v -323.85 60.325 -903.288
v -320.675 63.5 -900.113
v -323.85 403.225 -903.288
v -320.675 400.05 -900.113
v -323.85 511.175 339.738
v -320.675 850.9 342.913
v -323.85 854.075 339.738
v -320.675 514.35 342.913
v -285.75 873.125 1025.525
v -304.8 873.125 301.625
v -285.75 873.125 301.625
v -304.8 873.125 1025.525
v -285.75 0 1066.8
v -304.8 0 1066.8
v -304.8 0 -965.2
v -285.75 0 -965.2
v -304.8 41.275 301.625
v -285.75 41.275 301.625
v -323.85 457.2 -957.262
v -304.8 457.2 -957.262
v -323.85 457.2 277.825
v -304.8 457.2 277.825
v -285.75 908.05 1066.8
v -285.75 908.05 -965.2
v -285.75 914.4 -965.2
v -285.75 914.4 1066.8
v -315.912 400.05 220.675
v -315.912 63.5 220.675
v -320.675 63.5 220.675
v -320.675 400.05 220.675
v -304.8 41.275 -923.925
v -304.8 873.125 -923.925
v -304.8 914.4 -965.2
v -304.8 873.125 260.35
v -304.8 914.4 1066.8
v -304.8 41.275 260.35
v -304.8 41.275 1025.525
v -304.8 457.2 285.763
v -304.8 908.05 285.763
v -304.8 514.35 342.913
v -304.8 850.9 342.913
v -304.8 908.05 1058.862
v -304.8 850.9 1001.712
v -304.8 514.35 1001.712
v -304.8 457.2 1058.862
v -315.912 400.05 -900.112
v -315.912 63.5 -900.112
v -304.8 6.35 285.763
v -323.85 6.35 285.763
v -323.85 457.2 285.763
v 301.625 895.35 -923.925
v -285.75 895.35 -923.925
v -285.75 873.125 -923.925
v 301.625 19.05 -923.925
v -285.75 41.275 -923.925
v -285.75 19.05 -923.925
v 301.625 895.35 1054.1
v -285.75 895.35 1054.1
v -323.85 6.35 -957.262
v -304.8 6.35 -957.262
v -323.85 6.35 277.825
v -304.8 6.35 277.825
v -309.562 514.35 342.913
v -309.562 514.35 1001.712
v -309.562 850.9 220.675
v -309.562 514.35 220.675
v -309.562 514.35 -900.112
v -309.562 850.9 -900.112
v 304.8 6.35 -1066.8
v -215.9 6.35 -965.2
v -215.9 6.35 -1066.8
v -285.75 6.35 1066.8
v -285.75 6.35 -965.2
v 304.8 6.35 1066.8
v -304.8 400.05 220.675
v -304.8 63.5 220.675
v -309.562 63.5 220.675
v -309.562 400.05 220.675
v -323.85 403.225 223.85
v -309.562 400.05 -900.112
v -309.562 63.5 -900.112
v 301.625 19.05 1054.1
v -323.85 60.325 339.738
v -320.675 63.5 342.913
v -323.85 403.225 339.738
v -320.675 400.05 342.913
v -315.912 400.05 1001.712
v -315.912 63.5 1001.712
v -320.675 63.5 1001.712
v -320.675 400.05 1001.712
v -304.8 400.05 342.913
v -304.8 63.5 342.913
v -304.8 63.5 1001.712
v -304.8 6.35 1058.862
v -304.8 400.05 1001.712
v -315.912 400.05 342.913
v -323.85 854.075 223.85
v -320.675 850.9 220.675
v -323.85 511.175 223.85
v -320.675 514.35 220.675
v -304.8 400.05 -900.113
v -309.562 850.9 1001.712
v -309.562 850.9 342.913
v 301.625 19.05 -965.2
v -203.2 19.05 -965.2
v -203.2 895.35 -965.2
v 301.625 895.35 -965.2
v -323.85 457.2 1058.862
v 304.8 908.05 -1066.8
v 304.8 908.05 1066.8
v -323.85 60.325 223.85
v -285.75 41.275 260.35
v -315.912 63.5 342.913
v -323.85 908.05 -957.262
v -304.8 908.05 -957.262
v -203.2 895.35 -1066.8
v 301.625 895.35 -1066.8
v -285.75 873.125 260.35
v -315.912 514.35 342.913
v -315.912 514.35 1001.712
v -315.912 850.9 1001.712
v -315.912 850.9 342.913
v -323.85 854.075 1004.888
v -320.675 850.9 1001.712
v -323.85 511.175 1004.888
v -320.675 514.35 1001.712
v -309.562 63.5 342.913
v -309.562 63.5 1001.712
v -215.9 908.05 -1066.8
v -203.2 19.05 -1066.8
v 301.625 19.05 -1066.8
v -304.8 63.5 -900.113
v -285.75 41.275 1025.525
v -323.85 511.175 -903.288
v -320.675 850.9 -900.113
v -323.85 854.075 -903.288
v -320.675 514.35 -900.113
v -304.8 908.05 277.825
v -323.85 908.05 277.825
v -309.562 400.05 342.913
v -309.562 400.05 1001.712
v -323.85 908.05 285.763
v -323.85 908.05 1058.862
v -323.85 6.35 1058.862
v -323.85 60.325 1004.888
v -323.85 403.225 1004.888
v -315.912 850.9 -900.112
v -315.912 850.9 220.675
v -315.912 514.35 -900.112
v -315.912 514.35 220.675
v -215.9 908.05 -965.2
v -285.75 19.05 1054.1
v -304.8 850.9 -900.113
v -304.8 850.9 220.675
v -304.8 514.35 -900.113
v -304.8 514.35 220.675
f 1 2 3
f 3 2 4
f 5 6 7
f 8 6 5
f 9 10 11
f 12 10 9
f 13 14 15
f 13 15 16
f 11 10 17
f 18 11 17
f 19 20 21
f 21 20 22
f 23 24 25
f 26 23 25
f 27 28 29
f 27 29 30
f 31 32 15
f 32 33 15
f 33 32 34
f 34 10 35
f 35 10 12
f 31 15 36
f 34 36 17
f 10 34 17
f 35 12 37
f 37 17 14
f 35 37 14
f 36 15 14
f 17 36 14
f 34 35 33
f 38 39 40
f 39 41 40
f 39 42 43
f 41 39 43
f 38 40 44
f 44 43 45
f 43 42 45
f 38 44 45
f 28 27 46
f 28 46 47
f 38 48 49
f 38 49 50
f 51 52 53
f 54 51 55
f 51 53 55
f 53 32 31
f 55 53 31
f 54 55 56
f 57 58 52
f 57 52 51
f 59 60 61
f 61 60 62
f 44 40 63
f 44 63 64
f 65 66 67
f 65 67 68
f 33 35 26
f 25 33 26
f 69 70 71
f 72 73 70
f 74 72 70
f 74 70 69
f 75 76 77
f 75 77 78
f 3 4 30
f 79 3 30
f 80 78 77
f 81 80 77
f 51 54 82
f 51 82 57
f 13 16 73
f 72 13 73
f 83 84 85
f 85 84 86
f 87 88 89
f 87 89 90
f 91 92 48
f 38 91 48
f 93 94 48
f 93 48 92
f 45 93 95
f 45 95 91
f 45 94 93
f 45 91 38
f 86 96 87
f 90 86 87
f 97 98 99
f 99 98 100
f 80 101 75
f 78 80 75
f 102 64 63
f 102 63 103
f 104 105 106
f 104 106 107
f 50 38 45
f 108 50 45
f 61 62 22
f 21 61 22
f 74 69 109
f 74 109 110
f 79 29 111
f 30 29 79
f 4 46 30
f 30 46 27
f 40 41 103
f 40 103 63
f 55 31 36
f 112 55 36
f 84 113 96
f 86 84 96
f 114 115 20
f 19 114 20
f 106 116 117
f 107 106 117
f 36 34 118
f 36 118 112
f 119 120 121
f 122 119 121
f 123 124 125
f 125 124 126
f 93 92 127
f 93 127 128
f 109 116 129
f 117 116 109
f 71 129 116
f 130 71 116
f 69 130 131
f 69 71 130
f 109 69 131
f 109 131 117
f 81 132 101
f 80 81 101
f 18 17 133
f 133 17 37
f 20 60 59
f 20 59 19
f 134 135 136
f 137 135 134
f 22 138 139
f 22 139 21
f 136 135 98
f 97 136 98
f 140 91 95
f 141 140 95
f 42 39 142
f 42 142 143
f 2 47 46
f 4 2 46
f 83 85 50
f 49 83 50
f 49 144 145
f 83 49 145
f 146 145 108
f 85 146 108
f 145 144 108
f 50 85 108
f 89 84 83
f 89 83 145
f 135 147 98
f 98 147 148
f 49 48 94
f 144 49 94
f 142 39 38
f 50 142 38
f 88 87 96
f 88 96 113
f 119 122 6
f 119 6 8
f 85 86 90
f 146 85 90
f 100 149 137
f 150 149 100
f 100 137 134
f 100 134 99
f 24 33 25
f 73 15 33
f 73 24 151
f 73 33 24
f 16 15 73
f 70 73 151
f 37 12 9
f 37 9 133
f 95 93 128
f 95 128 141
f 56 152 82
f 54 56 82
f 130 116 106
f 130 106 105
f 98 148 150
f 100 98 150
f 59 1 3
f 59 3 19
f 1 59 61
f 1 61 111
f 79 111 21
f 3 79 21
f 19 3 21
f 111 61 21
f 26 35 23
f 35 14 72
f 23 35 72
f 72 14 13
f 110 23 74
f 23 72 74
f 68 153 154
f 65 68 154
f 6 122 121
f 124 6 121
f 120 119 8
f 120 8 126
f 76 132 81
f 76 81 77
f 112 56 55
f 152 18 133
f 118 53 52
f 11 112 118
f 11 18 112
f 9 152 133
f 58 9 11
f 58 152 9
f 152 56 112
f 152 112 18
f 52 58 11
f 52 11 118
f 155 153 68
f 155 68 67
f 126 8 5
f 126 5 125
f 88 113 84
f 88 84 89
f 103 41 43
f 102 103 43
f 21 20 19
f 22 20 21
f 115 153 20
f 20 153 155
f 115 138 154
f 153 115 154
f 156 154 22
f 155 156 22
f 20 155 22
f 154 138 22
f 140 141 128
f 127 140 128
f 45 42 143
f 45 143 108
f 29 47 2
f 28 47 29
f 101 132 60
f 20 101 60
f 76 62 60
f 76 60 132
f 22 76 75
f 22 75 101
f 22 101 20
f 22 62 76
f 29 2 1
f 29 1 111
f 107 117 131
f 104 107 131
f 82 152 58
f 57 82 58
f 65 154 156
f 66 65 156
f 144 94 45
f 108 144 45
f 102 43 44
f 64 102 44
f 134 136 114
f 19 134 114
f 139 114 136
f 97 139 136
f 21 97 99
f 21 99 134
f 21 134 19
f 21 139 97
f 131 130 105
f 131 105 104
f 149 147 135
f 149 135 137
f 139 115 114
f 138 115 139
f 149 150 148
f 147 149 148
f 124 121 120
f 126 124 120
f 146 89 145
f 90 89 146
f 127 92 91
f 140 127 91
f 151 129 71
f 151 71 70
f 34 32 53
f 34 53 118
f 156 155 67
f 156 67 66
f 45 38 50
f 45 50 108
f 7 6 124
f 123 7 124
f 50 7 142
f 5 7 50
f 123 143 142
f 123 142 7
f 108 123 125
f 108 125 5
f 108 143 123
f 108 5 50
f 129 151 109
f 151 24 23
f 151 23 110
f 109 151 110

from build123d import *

# Parameters (mm, degrees)
F0_W      = 609.6
F0_H      = 2133.6
F1_DEPTH  = 914.4
F2_W      = 88.9
F2_H      = 101.6
F3_DEPTH  = 914.401
F4_W      = 831.85
F4_H      = 1949.45
F5_DEPTH  = 19.05
F6_W      = 590.55
F6_H      = 6.35
F7_DEPTH  = 2133.601
F8_W      = 587.375
F8_H      = 876.3
F9_DEPTH  = 1990.725
F10_W     = 831.85
F10_H     = 41.275
F11_DEPTH = 19.05
F12_W     = 450.85
F12_H     = 1235.0877
F12_W_2   = 336.55
F12_H_2   = 1120.7877
F12_H_3   = 773.0998
F12_H_4   = 658.7998
F13_DEPTH = 19.05
F14_W     = 6.35
F14_H     = 336.55
F15_DEPTH = 1120.7877
F16_W     = 6.35
F16_H     = 336.55
F17_DEPTH = 658.7998
F18_SIZE  = 3.175
F20_W     = 504.825
F20_H     = 876.3
F21_DEPTH = 101.6
F22_W     = 876.3
F22_H     = 12.7
F23_DEPTH = 587.375


with BuildPart() as f1:
    # F0 (on Front) → F1 (new body)
    with BuildSketch(Plane.XZ):
        Rectangle(F0_W, F0_H)
    extrude(amount=-F1_DEPTH)

    # F2 (on face) → F3 (cut, through all)
    with BuildSketch(Plane.XZ):
        with Locations((-260.35, -1016)):
            Rectangle(F2_W, F2_H)
    extrude(amount=-F3_DEPTH, mode=Mode.SUBTRACT)

    # F4 (on face) → F5 (cut)
    with BuildSketch(Plane(origin=(-304.8, 0, 0), x_dir=(0, -1, 0), z_dir=(-1, 0, 0))):
        with Locations((-457.2, 50.8)):
            Rectangle(F4_W, F4_H)
    extrude(amount=-F5_DEPTH, mode=Mode.SUBTRACT)

    # F6 (on face) → F7 (cut, through all)
    with BuildSketch(Plane.XY.offset(1066.8)):
        with Locations((9.525, 911.225)):
            Rectangle(F6_W, F6_H)
        with Locations((9.525, 3.175)):
            Rectangle(F6_W, F6_H)
    extrude(amount=-F7_DEPTH, mode=Mode.SUBTRACT)

    # F8 (on face) → F9 (cut, through all)
    with BuildSketch(Plane.XY.offset(1066.8)):
        with Locations((7.9375, 457.2)):
            Rectangle(F8_W, F8_H)
    extrude(amount=-F9_DEPTH, mode=Mode.SUBTRACT)

    # F10 (on face) → F11 (join, through all)
    with BuildSketch(Plane(origin=(-304.8, 0, 0), x_dir=(0, -1, 0), z_dir=(-1, 0, 0))):
        with Locations((-457.2, 280.9875)):
            Rectangle(F10_W, F10_H)
    extrude(amount=-F11_DEPTH)

    # F20 (on face) → F21 (cut)
    with BuildSketch(Plane(origin=(0, 0, -1066.8), x_dir=(1, 0, 0), z_dir=(0, 0, -1))):
        with Locations((49.2125, -457.2)):
            Rectangle(F20_W, F20_H)
    extrude(amount=-F21_DEPTH, mode=Mode.SUBTRACT)

    # F22 (on face) → F23 (join, through all)
    with BuildSketch(Plane.YZ.offset(-285.75)):
        with Locations((457.2, 1060.45)):
            Rectangle(F22_W, F22_H)
    extrude(amount=F23_DEPTH)


with BuildPart() as f13:
    # F12 (on face) → F13 (new body)
    with BuildSketch(Plane(origin=(-304.8, 0, 0), x_dir=(0, -1, 0), z_dir=(-1, 0, 0))):
        with Locations((-682.625, -339.71865)):
            Rectangle(F12_W, F12_H)
        with Locations((-682.625, -339.71865)):
            Rectangle(F12_W_2, F12_H_2, mode=Mode.SUBTRACT)
        with Locations((-682.625, 672.3126)):
            Rectangle(F12_W, F12_H_3)
        with Locations((-682.625, 672.3126)):
            Rectangle(F12_W_2, F12_H_4, mode=Mode.SUBTRACT)
    extrude(amount=F13_DEPTH)

    # F14 (on face) → F15 (join, through all)
    with BuildSketch(Plane.XY.offset(-900.1125)):
        with Locations((-312.7375, 682.625)):
            Rectangle(F14_W, F14_H)
    extrude(amount=F15_DEPTH)

    # F16 (on face) → F17 (join, through all)
    with BuildSketch(Plane.XY.offset(342.9127)):
        with Locations((-312.7375, 682.625)):
            Rectangle(F16_W, F16_H)
    extrude(amount=F17_DEPTH)

    # F18
    f18_edges = [f13.edges().sort_by_distance(p)[0] for p in [
        (-323.85, 850.9, -339.71865),
        (-323.85, 682.625, -900.1125),
        (-323.85, 514.35, -339.71865),
        (-323.85, 682.625, 220.6752),
        (-323.85, 682.625, 342.9127),
        (-323.85, 850.9, 672.3126),
        (-323.85, 514.35, 672.3126),
        (-323.85, 682.625, 1001.7125),
    ]]
    chamfer(f18_edges, length=F18_SIZE)


with BuildPart() as f19_1:
    # F19: instance of F13
    add(f13.part.mirror(Plane(origin=(-314.325, 457.2, -339.71865), x_dir=(1, 0, 0), z_dir=(0, -1, 0))))


solid = Compound([f1.part, f13.part, f19_1.part])
